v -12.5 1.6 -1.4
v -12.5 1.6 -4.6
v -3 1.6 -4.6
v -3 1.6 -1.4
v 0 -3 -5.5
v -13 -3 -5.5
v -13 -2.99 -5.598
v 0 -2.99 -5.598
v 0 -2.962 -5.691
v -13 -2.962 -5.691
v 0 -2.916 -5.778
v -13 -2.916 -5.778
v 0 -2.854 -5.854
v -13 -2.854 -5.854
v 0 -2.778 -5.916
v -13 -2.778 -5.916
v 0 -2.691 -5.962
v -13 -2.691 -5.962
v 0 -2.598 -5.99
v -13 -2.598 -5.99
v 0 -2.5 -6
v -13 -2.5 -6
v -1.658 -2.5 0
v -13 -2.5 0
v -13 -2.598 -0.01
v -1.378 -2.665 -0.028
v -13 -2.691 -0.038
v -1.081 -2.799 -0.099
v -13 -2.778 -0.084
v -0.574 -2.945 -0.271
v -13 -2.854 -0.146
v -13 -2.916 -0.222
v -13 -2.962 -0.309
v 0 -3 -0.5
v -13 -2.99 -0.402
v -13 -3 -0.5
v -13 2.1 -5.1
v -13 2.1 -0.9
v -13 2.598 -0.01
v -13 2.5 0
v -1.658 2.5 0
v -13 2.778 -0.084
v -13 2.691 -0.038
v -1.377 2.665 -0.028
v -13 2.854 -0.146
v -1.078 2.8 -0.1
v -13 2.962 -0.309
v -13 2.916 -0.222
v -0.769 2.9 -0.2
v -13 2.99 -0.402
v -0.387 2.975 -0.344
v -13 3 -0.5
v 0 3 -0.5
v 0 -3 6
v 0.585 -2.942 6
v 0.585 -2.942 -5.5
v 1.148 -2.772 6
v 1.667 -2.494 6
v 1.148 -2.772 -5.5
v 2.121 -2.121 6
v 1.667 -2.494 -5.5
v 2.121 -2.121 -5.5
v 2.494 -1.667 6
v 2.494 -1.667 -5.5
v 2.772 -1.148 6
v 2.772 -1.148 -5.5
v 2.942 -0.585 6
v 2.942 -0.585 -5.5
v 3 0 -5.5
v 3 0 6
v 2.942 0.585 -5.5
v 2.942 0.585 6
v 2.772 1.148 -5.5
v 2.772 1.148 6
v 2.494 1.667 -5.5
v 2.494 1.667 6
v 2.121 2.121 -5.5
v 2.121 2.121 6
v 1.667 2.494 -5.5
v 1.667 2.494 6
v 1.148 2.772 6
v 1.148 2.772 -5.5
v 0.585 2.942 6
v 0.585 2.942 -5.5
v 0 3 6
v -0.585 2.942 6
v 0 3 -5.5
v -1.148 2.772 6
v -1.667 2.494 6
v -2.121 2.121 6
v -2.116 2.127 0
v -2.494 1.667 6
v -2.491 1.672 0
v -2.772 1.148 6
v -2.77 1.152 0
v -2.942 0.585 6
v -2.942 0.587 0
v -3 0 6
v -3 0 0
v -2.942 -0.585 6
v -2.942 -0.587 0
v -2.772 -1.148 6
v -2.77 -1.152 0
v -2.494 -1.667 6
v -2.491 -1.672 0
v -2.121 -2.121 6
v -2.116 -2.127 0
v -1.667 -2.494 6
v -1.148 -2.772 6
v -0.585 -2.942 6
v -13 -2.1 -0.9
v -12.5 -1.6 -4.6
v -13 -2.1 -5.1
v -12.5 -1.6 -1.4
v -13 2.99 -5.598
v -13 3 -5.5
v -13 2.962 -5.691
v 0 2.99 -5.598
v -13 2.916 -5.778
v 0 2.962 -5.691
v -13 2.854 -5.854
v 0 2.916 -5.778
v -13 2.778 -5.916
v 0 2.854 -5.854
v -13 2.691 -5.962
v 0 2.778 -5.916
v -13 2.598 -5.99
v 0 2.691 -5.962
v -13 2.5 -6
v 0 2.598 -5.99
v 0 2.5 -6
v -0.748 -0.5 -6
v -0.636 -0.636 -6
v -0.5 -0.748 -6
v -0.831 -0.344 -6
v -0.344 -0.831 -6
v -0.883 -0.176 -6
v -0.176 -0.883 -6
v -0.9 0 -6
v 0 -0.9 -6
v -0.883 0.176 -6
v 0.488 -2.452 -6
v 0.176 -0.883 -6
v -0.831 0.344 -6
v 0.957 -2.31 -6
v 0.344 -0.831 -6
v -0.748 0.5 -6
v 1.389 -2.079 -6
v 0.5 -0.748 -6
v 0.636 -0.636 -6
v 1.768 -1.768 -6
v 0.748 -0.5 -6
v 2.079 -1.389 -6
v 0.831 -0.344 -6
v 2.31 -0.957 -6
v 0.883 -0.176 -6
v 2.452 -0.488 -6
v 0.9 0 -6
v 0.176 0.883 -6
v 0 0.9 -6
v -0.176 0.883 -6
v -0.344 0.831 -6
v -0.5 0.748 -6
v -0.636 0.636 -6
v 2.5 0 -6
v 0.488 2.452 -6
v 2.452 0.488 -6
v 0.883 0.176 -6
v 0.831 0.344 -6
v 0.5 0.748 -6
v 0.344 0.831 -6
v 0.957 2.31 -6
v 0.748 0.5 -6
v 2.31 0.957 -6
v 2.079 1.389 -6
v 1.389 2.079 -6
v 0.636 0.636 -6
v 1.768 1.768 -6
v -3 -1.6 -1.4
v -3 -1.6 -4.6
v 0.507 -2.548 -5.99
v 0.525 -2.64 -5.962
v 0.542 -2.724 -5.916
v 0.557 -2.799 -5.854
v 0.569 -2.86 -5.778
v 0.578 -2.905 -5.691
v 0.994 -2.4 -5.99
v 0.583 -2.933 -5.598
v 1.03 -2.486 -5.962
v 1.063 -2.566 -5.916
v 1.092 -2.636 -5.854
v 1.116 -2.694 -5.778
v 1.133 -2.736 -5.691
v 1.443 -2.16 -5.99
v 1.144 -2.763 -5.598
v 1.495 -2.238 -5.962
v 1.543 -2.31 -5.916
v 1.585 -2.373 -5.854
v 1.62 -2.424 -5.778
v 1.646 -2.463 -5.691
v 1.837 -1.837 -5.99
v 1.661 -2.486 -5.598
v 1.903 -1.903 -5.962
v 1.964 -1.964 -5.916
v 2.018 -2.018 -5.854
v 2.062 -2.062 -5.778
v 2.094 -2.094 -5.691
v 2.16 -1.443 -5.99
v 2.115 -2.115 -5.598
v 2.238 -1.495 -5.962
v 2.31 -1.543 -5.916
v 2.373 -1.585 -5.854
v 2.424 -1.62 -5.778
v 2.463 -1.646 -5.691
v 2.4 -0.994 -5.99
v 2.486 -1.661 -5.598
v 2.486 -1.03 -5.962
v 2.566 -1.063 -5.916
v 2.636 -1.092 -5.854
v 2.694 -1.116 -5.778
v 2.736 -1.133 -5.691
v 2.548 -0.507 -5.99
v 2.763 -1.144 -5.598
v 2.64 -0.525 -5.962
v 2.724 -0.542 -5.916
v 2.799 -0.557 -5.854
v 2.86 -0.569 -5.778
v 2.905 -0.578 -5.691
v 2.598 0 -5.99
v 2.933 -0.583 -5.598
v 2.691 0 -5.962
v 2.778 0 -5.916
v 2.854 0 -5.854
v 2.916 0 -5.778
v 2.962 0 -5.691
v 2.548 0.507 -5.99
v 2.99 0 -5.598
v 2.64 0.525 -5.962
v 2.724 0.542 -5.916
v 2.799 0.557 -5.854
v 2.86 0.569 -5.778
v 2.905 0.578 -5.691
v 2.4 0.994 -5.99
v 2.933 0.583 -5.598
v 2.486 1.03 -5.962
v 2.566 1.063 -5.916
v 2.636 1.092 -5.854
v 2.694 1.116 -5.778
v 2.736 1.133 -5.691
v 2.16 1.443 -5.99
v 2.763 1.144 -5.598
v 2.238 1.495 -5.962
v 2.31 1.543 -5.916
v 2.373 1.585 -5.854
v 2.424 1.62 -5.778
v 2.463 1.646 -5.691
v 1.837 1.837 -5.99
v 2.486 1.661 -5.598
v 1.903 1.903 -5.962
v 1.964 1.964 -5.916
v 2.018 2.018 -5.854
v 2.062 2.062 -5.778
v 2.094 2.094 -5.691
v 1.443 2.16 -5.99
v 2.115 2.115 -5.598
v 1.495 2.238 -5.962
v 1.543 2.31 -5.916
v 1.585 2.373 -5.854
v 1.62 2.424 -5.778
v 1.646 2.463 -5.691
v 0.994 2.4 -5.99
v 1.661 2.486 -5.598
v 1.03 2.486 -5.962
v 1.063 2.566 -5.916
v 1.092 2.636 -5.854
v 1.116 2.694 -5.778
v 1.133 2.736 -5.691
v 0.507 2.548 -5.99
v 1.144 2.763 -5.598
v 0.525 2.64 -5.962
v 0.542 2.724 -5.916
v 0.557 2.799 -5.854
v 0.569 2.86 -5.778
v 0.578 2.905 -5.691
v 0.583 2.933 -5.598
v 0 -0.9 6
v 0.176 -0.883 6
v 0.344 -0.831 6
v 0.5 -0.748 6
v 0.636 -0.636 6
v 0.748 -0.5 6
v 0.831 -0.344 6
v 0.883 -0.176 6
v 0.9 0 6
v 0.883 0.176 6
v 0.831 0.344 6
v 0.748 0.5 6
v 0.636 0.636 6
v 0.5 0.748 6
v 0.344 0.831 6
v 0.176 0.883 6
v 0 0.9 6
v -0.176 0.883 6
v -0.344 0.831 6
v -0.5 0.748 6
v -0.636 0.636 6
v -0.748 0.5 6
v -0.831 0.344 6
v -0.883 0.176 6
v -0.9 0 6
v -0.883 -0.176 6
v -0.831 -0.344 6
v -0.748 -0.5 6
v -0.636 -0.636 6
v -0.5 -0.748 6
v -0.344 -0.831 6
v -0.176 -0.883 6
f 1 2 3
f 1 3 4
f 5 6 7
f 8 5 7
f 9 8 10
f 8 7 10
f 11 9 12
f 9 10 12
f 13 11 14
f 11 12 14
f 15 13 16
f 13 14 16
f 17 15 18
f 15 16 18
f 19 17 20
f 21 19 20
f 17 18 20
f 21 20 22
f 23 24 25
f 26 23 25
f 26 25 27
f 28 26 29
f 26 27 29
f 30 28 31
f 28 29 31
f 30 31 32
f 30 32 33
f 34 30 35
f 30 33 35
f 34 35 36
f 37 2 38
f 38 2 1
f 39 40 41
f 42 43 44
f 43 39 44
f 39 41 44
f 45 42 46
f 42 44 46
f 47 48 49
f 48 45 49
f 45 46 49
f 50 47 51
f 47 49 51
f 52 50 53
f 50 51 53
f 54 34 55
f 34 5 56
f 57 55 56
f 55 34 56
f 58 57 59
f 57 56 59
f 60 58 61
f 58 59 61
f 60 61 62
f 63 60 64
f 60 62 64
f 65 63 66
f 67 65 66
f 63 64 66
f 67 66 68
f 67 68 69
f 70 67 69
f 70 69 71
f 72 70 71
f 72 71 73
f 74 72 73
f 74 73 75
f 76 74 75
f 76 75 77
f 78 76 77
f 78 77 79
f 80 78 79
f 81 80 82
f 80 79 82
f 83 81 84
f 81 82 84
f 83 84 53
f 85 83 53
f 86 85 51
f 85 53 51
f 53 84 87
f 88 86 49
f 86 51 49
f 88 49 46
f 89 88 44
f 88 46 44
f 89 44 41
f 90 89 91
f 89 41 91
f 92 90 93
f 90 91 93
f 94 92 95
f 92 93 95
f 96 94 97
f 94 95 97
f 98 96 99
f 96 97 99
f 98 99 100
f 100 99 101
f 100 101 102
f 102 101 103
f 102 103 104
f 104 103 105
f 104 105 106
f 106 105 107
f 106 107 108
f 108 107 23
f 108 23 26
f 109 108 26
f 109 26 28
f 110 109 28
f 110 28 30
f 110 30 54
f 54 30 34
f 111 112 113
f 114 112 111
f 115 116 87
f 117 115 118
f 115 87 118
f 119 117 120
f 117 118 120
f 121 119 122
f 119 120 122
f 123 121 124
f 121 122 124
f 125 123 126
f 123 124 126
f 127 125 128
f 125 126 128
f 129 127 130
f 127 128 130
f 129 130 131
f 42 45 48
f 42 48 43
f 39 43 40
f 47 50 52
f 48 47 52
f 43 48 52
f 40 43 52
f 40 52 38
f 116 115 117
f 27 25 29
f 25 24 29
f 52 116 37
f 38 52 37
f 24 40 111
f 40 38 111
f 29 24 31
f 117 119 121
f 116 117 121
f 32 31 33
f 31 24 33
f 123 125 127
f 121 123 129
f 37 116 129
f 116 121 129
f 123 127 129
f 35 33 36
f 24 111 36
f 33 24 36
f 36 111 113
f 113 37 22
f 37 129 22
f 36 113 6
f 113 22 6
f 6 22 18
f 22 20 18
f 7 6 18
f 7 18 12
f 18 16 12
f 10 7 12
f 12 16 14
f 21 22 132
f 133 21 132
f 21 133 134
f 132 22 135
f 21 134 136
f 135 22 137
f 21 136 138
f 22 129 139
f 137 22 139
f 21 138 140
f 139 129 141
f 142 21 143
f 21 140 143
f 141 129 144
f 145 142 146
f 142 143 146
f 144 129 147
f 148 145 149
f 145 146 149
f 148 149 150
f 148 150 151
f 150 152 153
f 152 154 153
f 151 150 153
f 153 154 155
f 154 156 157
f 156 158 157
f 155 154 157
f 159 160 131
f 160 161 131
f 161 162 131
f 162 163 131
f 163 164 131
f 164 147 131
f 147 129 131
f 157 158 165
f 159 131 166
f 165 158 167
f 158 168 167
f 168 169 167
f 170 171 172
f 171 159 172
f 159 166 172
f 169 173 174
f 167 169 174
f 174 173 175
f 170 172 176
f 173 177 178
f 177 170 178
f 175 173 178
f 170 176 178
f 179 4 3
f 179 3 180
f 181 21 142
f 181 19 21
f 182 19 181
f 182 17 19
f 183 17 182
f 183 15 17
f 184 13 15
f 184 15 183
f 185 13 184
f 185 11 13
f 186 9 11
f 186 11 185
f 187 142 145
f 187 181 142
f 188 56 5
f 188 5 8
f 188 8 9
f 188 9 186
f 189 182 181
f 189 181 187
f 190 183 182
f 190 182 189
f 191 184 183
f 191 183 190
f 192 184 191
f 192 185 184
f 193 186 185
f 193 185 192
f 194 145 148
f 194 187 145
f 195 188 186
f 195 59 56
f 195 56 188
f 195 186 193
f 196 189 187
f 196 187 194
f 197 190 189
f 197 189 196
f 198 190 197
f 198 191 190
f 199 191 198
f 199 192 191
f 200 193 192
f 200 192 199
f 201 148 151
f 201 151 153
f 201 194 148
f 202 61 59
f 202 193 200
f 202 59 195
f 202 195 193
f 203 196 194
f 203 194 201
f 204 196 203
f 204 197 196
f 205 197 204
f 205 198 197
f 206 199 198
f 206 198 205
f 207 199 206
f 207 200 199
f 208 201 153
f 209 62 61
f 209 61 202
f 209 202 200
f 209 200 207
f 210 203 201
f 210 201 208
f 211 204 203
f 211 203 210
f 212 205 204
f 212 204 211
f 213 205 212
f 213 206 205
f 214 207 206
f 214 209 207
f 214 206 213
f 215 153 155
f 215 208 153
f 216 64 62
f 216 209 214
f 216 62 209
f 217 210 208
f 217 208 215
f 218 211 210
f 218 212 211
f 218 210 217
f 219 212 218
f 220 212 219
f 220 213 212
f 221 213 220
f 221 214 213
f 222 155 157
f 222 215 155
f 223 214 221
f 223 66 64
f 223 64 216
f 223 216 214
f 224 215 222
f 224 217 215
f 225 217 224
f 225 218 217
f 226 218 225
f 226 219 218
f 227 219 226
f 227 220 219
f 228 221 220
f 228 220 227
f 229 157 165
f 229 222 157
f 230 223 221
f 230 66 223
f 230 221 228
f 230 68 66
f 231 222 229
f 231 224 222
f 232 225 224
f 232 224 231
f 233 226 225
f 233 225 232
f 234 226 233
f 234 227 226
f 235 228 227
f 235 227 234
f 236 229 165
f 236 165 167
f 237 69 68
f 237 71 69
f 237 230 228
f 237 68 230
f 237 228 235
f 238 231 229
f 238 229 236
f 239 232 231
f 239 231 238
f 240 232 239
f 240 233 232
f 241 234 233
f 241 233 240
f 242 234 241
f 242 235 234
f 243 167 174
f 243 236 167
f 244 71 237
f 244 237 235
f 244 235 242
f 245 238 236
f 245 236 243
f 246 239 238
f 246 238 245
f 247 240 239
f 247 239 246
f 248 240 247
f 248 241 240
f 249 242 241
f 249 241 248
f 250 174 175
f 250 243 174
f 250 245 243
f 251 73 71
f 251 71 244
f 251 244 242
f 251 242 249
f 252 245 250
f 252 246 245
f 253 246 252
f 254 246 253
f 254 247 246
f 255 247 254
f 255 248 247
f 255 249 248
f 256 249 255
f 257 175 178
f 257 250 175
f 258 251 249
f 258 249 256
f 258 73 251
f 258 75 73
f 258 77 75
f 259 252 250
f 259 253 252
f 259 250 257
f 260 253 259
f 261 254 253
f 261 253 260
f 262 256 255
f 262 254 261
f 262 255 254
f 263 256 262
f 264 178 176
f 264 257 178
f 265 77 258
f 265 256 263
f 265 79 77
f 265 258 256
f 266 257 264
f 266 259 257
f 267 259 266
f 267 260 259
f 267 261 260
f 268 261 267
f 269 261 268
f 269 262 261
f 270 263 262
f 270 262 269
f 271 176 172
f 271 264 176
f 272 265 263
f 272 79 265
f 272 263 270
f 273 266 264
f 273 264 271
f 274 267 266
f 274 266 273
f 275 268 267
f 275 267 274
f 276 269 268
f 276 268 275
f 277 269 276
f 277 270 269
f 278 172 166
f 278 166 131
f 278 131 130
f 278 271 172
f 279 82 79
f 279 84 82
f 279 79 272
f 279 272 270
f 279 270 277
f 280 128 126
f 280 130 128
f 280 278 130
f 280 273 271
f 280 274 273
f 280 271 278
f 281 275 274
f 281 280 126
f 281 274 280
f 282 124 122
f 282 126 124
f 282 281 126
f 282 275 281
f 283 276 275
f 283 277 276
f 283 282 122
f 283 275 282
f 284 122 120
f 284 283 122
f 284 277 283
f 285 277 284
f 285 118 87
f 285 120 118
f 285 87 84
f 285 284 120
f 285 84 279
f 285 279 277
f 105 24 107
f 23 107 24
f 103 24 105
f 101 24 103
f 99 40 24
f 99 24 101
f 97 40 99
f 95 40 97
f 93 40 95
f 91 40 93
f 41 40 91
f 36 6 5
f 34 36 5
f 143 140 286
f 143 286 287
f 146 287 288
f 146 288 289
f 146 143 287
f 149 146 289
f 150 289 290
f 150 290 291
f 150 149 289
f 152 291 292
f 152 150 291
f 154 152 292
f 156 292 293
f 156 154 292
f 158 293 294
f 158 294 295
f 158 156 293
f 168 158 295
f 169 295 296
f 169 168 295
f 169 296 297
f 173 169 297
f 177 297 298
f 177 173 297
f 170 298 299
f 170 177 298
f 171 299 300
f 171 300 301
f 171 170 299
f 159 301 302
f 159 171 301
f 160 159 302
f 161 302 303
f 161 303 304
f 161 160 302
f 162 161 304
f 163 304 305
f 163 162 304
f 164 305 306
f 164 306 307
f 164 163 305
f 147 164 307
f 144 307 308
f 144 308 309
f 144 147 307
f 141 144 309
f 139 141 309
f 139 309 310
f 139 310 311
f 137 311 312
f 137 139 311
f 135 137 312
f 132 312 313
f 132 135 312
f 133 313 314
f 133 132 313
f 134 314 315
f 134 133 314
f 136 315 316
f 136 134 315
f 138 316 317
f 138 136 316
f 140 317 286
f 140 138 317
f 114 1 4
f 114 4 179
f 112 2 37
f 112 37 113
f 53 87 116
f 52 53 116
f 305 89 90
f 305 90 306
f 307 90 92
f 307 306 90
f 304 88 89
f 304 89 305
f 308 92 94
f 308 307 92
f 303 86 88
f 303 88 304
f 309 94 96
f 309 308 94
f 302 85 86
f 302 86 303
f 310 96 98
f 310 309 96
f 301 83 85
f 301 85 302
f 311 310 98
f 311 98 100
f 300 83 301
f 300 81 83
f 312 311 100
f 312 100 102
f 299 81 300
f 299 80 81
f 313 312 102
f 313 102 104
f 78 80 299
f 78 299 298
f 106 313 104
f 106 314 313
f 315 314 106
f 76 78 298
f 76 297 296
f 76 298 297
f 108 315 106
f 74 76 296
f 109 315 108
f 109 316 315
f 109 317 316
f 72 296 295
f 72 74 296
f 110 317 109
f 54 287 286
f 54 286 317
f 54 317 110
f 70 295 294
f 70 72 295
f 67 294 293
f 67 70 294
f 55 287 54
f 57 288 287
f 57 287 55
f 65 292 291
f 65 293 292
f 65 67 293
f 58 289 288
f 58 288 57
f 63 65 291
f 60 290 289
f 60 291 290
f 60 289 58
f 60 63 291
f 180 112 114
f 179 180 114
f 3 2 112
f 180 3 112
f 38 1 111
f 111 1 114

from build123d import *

# Parameters (mm, degrees)
SKETCH3_R             = 3
SKETCH3_R_2           = 0.9
BOSS_EXTRUDE1_DEPTH   = 12
BOSS_EXTRUDE2_DEPTH   = 6
SKETCH5_W             = 3.2
SKETCH5_H             = 3.2
CUT_EXTRUDE1_DEPTH    = 10
FILLET1_R             = 0.5
CHAMFER1_SIZE         = 0.5
BODY_MOVE_COPY1_ANGLE = 90


with BuildPart() as part:
    # Sketch3 → Boss-Extrude1 (new body)
    with BuildSketch(Plane(origin=(0, 0, 0), x_dir=(1, 0, 0), z_dir=(0, 1, 0))):
        with Locations(Location((0, 0, 0), (0, 0, 270))):
            Circle(SKETCH3_R)
        with Locations(Location((0, 0, 0), (0, 0, 270))):
            Circle(SKETCH3_R_2, mode=Mode.SUBTRACT)
    extrude(amount=BOSS_EXTRUDE1_DEPTH)

    # Boss-Extrude2: read off the stored shape, not the designer's step
    # Boss-Extrude2 outline → Boss-Extrude2 (add)
    with BuildSketch(Plane(origin=(0, 0, 0), x_dir=(1, 0, 0), z_dir=(0, 1, 0))):
        with BuildLine():
            Line((-13, -3), (0, -3))
            ThreePointArc((0, -3), (-3, 0), (0, 3))
            Line((0, 3), (-13, 3))
            Line((-13, 3), (-13, -3))
        make_face()
    extrude(amount=BOSS_EXTRUDE2_DEPTH)

    # Sketch5 → Cut-Extrude1 (cut)
    with BuildSketch(Plane.ZY.offset(13)):
        with Locations((0, 3)):
            Rectangle(SKETCH5_W, SKETCH5_H)
    extrude(amount=-CUT_EXTRUDE1_DEPTH, mode=Mode.SUBTRACT)

    # Fillet1
    # the kernel refuses this fillet: 0.5 mm, written as the material it takes off along each edge
    with BuildSketch(Plane(origin=(-14.25, 0, 3), x_dir=(0, 0, -1), z_dir=(1, 0, 0)), Plane(origin=(0, 0, -3), x_dir=(0, 0, 1), z_dir=(-1, 0, 0))) as fillet1_piece_1:
        with BuildLine():
            CenterArc((FILLET1_R, FILLET1_R), FILLET1_R, 180, 90)
            Line((0, FILLET1_R), (0, 0))
            Line((0, 0), (FILLET1_R, 0))
        make_face()
    extrude(amount=14.25, mode=Mode.SUBTRACT)
    with BuildSketch(Plane(origin=(-14.25, 6, 3), x_dir=(0, 0, -1), z_dir=(1, 0, 0))) as fillet1_piece_2_section:
        with BuildLine():
            CenterArc((FILLET1_R, -FILLET1_R), FILLET1_R, 90, 90)
            Line((0, -FILLET1_R), (0, 0))
            Line((0, 0), (FILLET1_R, 0))
        make_face()
    fillet1_piece_2 = extrude(amount=16.375, mode=Mode.PRIVATE)
    fillet1_piece_2 = fillet1_piece_2 - Plane(origin=(0, 6, 0), x_dir=(0, 0, 1), z_dir=(0, -1, 0)) * Cylinder(3, 35, mode=Mode.PRIVATE)
    add(fillet1_piece_2, mode=Mode.SUBTRACT)
    with BuildSketch(Plane(origin=(2.125, 6, -3), x_dir=(0, -1, 0), z_dir=(-1, 0, 0))) as fillet1_piece_3_section:
        with BuildLine():
            CenterArc((FILLET1_R, FILLET1_R), FILLET1_R, 180, 90)
            Line((0, FILLET1_R), (0, 0))
            Line((0, 0), (FILLET1_R, 0))
        make_face()
    fillet1_piece_3 = extrude(amount=16.375, mode=Mode.PRIVATE)
    fillet1_piece_3 = fillet1_piece_3 - Plane(origin=(0, 6, 0), x_dir=(0, 0, 1), z_dir=(0, -1, 0)) * Cylinder(3, 35, mode=Mode.PRIVATE)
    add(fillet1_piece_3, mode=Mode.SUBTRACT)
    with BuildSketch(Plane(origin=(0, 0, 0), x_dir=(0, 0, 1), z_dir=(-1, 0, 0))) as fillet1_piece_4:
        with BuildLine():
            CenterArc((3 - FILLET1_R, FILLET1_R), FILLET1_R, 270, 90)
            Line((3 - FILLET1_R, 0), (3, 0))
            Line((3, 0), (3, FILLET1_R))
        make_face()
    revolve(axis=Axis((0, 0, 0), (0, 1, 0)), revolution_arc=180, mode=Mode.SUBTRACT)

    # Chamfer1
    chamfer1_edges = [part.edges().sort_by_distance(p)[0] for p in [
        (-13, 3, 1.6),
        (-13, 4.6, 0),
        (-13, 3, -1.6),
        (-13, 1.4, 0),
    ]]
    chamfer(chamfer1_edges, length=CHAMFER1_SIZE)


with BuildPart() as part_1:
    # Body-Move/Copy1: read off the stored shape, not the designer's step
    # Body-Move/Copy1: moved
    add(part.part.moved(Location((0, -6, 0))).rotate(Axis((0, 0, 0), (1, 0, 0)), BODY_MOVE_COPY1_ANGLE))


solid = part_1.part
